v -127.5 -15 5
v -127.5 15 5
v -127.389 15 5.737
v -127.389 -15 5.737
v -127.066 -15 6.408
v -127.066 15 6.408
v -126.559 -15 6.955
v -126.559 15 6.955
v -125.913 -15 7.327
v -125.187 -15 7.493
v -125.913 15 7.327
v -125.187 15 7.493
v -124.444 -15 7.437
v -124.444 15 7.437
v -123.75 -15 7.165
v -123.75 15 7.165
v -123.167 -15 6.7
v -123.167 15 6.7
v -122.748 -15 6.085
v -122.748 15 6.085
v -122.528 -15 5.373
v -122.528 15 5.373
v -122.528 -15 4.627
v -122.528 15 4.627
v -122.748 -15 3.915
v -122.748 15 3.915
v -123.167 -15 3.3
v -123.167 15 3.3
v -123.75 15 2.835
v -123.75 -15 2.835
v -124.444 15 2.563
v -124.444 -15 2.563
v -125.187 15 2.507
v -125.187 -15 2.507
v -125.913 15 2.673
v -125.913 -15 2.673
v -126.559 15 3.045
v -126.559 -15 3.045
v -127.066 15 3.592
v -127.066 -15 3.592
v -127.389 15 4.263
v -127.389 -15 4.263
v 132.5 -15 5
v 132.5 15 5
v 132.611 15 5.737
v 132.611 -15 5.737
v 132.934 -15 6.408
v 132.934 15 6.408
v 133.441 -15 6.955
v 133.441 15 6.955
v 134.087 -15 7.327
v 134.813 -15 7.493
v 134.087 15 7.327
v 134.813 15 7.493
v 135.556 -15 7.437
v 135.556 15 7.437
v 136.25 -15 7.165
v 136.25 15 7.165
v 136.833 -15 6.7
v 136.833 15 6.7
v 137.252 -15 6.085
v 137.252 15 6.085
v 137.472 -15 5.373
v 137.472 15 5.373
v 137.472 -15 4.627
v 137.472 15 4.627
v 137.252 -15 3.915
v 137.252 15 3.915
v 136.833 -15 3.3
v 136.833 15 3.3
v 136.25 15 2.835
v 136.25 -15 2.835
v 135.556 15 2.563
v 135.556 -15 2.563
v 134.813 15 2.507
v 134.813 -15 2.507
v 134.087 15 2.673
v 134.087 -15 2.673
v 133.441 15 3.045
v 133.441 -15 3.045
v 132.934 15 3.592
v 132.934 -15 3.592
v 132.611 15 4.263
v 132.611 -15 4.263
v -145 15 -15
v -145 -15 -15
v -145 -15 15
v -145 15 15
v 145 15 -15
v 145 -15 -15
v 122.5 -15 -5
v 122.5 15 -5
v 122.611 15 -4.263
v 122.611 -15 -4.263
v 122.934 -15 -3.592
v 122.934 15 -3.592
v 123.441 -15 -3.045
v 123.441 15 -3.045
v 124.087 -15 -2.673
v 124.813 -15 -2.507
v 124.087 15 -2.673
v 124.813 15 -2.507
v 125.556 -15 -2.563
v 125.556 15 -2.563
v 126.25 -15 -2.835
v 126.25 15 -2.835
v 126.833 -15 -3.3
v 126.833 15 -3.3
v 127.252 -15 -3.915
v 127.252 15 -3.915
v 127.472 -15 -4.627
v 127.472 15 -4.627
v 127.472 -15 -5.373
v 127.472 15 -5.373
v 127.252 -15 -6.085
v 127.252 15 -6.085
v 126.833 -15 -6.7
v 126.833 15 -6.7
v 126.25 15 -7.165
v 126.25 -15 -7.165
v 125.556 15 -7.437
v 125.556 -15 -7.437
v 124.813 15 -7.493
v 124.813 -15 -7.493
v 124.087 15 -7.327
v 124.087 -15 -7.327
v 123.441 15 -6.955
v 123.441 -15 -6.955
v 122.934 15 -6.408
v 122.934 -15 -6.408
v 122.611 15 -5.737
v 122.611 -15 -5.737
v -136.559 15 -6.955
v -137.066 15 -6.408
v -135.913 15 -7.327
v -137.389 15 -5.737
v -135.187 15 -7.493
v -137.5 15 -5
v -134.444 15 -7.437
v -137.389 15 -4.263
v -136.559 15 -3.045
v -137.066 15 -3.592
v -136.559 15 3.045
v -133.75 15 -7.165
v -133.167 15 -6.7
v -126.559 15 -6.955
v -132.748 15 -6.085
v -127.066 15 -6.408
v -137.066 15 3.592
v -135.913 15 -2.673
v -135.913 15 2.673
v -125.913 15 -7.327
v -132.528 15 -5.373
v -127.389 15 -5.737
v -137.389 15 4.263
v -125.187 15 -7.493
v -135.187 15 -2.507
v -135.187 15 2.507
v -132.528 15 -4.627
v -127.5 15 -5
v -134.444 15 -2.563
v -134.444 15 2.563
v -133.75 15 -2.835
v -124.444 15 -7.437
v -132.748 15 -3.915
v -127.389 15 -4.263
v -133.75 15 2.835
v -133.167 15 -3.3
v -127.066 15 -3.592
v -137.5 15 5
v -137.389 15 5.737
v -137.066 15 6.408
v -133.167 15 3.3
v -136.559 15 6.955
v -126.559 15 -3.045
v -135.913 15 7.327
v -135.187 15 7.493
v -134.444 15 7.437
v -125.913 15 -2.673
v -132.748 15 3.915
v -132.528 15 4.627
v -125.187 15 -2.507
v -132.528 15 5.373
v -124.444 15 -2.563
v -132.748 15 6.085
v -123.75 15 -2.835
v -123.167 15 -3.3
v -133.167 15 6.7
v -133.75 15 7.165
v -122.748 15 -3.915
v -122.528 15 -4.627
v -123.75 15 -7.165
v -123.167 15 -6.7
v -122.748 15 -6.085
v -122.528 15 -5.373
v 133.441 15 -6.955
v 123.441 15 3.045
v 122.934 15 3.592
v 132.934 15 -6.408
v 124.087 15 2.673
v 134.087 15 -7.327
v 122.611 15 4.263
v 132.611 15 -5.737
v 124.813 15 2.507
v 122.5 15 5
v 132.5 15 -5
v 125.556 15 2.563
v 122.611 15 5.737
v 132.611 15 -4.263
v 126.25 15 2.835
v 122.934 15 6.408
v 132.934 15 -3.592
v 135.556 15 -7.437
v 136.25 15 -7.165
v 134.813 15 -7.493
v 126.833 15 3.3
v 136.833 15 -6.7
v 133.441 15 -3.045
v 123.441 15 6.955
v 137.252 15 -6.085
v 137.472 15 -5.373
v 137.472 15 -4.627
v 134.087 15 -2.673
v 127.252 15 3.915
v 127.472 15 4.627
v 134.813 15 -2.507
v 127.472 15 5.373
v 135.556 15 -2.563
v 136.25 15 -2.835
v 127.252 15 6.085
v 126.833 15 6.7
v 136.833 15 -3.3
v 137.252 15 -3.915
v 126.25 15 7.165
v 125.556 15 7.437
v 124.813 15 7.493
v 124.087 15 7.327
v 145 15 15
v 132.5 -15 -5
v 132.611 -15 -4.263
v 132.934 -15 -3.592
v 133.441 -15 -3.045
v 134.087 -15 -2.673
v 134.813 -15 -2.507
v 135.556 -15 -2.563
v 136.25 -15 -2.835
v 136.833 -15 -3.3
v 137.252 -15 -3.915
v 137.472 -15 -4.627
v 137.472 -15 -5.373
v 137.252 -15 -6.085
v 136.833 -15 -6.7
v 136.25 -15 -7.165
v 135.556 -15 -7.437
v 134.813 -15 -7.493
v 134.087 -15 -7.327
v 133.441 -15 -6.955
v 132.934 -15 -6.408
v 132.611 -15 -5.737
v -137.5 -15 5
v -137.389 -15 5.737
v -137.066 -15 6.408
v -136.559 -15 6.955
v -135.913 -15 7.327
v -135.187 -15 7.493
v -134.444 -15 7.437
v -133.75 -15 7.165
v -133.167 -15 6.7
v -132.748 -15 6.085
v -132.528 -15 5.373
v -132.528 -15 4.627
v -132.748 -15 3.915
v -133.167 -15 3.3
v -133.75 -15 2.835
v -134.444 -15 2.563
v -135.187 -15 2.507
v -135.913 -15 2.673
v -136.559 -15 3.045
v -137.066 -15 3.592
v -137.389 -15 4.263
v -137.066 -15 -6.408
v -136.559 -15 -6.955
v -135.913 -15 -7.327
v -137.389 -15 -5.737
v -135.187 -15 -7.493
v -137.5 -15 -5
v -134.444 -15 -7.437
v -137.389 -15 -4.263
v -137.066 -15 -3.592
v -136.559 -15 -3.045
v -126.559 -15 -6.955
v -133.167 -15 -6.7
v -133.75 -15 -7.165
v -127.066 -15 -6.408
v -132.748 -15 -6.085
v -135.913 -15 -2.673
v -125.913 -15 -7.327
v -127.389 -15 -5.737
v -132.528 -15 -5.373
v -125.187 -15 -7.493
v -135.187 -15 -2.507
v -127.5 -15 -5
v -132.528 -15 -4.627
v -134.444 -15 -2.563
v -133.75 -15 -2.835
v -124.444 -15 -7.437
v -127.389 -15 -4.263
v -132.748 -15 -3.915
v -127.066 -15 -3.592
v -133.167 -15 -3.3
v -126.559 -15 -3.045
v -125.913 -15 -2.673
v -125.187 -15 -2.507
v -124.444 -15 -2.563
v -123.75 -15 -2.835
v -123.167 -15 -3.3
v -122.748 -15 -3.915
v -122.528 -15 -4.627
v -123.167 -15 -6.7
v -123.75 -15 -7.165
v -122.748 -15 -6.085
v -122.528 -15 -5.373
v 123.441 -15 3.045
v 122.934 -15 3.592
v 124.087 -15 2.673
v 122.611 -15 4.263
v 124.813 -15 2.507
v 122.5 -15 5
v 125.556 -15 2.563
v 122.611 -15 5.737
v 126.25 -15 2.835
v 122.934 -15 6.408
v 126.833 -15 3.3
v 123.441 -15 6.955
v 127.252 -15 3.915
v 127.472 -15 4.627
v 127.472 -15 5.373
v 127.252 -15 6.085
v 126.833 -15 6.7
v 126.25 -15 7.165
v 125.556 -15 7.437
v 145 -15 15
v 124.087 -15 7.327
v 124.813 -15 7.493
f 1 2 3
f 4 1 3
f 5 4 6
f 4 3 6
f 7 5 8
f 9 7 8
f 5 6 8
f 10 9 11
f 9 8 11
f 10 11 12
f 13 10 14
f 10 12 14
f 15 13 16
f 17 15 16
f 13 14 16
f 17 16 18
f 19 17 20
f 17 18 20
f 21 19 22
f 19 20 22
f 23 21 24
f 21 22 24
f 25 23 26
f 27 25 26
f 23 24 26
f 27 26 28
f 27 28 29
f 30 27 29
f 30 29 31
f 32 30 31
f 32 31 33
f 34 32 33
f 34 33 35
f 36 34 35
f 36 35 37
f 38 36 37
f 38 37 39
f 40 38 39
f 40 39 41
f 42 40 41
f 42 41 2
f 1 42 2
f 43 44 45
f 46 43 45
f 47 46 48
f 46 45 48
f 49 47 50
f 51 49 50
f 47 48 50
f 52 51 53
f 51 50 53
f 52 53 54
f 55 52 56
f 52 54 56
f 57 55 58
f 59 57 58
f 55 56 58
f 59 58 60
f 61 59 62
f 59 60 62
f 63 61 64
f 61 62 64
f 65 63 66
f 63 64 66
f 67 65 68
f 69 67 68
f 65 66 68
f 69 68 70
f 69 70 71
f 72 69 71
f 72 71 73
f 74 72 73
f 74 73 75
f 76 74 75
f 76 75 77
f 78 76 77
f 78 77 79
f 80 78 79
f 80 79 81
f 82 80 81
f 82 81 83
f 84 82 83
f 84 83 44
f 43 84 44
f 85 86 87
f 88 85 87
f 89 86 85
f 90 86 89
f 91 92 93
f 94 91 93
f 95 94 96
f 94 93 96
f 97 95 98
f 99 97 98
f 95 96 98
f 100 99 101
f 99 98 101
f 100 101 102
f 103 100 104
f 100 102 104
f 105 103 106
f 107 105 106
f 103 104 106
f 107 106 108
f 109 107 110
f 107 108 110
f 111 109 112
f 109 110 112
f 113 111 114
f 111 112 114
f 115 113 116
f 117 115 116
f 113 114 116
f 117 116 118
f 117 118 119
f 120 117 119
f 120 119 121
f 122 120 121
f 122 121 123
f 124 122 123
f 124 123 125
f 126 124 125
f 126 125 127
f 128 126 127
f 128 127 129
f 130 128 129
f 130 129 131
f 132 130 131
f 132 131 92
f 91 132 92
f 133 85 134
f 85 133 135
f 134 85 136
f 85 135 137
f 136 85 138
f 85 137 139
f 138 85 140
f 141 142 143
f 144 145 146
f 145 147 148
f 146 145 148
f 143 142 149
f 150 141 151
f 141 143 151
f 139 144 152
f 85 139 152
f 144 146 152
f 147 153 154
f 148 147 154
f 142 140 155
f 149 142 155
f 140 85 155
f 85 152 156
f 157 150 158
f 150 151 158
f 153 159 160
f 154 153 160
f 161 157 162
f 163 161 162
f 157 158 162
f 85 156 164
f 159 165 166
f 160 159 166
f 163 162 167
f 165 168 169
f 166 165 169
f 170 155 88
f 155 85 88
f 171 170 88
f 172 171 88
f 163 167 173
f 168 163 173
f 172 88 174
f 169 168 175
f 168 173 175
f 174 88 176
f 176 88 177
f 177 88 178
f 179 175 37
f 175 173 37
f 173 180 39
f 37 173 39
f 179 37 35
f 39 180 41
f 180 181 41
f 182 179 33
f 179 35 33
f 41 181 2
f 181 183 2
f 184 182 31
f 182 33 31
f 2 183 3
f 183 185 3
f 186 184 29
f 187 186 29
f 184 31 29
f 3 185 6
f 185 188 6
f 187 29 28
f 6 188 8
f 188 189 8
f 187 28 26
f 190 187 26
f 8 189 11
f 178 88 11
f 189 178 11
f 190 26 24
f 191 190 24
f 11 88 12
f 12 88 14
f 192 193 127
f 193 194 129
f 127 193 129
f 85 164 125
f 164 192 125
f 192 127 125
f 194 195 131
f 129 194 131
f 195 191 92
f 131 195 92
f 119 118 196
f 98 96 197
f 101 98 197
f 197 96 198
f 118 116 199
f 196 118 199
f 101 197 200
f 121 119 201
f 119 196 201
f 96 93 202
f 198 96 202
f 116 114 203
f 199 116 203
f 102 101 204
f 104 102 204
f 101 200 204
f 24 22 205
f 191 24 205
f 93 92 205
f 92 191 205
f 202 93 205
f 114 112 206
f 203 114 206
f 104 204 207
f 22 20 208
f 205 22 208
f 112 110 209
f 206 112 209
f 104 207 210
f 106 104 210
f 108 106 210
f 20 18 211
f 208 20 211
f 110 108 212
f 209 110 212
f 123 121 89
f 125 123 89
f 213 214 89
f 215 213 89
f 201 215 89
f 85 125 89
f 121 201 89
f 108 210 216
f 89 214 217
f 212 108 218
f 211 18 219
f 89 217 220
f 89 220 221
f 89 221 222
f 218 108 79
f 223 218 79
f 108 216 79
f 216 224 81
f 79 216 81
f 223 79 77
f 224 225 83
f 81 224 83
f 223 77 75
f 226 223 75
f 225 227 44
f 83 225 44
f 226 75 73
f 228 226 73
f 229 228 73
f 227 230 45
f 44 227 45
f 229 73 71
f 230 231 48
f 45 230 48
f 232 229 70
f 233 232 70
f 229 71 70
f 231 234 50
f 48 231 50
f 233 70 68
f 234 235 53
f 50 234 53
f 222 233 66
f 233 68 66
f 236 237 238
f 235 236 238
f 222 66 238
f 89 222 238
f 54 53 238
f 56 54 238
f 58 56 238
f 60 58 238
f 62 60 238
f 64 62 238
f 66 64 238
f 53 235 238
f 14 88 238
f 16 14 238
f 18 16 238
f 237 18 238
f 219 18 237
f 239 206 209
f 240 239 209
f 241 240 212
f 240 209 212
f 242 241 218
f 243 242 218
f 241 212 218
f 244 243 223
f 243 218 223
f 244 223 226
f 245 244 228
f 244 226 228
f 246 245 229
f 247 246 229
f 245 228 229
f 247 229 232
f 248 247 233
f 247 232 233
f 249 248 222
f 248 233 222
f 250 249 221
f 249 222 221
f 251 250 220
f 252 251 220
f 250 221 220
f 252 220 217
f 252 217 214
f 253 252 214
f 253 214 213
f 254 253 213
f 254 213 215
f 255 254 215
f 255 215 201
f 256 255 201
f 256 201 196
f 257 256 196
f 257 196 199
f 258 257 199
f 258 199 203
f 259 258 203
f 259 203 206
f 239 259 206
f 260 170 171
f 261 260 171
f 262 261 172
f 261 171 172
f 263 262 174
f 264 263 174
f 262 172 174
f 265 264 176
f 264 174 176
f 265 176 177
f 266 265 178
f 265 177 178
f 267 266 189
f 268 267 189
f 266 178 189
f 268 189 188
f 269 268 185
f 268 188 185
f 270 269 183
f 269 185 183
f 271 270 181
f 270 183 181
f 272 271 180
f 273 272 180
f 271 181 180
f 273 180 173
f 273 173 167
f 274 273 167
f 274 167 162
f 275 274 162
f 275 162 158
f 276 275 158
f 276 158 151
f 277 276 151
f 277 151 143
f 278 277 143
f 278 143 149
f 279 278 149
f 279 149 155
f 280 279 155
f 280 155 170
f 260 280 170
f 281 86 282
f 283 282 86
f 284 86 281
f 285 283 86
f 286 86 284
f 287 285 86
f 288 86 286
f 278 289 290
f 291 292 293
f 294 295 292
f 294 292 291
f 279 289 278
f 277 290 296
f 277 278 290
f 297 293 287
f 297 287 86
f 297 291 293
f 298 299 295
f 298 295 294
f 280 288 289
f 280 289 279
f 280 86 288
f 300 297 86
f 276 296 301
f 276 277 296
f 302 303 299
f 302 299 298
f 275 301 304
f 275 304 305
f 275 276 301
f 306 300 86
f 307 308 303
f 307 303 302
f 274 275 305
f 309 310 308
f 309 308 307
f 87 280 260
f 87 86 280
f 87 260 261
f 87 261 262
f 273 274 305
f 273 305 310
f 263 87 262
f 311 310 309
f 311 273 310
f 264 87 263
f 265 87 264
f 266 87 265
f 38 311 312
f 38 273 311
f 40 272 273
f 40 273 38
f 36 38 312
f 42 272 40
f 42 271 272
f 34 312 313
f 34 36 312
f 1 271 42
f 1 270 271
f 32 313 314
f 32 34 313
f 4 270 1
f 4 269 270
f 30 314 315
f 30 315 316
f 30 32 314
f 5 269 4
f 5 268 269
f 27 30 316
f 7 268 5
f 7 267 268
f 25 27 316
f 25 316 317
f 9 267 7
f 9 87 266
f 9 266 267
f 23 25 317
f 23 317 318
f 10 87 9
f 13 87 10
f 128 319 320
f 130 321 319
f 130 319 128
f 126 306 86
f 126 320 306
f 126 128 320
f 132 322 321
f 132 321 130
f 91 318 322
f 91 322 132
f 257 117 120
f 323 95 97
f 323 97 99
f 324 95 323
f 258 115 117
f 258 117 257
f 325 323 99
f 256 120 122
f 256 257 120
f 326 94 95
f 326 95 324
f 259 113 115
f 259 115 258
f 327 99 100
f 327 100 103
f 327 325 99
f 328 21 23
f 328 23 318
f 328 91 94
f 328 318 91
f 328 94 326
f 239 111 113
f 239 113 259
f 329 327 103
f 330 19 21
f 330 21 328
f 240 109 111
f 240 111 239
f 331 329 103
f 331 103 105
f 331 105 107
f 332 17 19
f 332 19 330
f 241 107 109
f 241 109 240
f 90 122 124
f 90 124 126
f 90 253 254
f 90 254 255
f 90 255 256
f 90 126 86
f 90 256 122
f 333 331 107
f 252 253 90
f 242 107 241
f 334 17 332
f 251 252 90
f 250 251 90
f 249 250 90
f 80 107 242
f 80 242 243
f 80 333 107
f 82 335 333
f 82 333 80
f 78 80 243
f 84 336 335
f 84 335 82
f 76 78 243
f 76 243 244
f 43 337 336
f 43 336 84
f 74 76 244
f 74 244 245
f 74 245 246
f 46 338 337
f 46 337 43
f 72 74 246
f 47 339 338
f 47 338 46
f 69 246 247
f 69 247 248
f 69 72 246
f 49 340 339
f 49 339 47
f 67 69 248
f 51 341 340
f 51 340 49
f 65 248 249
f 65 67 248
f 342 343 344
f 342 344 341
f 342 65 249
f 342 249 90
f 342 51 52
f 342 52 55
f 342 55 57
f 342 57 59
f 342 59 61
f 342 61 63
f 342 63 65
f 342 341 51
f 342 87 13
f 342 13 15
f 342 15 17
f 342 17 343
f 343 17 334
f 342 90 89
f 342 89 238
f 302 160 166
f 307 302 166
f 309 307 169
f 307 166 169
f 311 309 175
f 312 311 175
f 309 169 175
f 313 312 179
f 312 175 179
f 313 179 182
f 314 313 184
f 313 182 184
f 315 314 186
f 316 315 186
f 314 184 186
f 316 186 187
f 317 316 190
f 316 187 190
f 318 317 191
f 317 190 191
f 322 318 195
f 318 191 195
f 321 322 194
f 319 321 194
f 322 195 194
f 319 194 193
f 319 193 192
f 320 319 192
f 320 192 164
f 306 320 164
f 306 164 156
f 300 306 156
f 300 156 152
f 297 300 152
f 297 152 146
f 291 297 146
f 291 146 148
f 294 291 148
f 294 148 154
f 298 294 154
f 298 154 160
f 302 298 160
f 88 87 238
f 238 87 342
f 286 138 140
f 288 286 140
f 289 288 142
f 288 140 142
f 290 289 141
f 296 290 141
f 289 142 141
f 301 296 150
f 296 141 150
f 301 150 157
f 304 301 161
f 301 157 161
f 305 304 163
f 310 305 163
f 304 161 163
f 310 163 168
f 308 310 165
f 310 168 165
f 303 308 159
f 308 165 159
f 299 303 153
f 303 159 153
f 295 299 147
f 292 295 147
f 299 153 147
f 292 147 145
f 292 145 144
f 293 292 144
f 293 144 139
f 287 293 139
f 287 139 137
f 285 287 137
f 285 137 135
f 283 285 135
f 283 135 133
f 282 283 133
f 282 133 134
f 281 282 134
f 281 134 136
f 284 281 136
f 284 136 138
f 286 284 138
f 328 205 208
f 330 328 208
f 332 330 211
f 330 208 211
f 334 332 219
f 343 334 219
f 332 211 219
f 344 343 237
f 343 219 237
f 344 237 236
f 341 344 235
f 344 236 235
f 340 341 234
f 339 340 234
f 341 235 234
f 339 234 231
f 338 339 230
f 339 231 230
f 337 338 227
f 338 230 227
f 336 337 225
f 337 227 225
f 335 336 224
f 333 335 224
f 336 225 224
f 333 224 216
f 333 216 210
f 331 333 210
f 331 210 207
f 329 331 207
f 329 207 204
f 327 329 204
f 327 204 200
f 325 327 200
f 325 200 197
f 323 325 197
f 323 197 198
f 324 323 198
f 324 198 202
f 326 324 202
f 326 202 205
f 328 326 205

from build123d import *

# Parameters (mm, degrees)
F0_W     = 290
F0_H     = 30
F1_DEPTH = 15
F3_D     = 5


# Not quite as in the source:
# - a feature names something its author has since deleted; it is built from what else it names


with BuildPart() as f1:
    # F0 (on Front) → F1 (new body, symmetric)
    with BuildSketch(Plane.XZ):
        Rectangle(F0_W, F0_H)
    extrude(amount=F1_DEPTH, both=True)

    # F3 (through all)
    with Locations(Plane.XZ.offset(15)):
        with Locations((-135, 5), (-135, -5), (-125, 5), (-125, -5), (125, 5), (125, -5), (135, 5), (135, -5)):
            Hole(F3_D / 2)


solid = f1.part
